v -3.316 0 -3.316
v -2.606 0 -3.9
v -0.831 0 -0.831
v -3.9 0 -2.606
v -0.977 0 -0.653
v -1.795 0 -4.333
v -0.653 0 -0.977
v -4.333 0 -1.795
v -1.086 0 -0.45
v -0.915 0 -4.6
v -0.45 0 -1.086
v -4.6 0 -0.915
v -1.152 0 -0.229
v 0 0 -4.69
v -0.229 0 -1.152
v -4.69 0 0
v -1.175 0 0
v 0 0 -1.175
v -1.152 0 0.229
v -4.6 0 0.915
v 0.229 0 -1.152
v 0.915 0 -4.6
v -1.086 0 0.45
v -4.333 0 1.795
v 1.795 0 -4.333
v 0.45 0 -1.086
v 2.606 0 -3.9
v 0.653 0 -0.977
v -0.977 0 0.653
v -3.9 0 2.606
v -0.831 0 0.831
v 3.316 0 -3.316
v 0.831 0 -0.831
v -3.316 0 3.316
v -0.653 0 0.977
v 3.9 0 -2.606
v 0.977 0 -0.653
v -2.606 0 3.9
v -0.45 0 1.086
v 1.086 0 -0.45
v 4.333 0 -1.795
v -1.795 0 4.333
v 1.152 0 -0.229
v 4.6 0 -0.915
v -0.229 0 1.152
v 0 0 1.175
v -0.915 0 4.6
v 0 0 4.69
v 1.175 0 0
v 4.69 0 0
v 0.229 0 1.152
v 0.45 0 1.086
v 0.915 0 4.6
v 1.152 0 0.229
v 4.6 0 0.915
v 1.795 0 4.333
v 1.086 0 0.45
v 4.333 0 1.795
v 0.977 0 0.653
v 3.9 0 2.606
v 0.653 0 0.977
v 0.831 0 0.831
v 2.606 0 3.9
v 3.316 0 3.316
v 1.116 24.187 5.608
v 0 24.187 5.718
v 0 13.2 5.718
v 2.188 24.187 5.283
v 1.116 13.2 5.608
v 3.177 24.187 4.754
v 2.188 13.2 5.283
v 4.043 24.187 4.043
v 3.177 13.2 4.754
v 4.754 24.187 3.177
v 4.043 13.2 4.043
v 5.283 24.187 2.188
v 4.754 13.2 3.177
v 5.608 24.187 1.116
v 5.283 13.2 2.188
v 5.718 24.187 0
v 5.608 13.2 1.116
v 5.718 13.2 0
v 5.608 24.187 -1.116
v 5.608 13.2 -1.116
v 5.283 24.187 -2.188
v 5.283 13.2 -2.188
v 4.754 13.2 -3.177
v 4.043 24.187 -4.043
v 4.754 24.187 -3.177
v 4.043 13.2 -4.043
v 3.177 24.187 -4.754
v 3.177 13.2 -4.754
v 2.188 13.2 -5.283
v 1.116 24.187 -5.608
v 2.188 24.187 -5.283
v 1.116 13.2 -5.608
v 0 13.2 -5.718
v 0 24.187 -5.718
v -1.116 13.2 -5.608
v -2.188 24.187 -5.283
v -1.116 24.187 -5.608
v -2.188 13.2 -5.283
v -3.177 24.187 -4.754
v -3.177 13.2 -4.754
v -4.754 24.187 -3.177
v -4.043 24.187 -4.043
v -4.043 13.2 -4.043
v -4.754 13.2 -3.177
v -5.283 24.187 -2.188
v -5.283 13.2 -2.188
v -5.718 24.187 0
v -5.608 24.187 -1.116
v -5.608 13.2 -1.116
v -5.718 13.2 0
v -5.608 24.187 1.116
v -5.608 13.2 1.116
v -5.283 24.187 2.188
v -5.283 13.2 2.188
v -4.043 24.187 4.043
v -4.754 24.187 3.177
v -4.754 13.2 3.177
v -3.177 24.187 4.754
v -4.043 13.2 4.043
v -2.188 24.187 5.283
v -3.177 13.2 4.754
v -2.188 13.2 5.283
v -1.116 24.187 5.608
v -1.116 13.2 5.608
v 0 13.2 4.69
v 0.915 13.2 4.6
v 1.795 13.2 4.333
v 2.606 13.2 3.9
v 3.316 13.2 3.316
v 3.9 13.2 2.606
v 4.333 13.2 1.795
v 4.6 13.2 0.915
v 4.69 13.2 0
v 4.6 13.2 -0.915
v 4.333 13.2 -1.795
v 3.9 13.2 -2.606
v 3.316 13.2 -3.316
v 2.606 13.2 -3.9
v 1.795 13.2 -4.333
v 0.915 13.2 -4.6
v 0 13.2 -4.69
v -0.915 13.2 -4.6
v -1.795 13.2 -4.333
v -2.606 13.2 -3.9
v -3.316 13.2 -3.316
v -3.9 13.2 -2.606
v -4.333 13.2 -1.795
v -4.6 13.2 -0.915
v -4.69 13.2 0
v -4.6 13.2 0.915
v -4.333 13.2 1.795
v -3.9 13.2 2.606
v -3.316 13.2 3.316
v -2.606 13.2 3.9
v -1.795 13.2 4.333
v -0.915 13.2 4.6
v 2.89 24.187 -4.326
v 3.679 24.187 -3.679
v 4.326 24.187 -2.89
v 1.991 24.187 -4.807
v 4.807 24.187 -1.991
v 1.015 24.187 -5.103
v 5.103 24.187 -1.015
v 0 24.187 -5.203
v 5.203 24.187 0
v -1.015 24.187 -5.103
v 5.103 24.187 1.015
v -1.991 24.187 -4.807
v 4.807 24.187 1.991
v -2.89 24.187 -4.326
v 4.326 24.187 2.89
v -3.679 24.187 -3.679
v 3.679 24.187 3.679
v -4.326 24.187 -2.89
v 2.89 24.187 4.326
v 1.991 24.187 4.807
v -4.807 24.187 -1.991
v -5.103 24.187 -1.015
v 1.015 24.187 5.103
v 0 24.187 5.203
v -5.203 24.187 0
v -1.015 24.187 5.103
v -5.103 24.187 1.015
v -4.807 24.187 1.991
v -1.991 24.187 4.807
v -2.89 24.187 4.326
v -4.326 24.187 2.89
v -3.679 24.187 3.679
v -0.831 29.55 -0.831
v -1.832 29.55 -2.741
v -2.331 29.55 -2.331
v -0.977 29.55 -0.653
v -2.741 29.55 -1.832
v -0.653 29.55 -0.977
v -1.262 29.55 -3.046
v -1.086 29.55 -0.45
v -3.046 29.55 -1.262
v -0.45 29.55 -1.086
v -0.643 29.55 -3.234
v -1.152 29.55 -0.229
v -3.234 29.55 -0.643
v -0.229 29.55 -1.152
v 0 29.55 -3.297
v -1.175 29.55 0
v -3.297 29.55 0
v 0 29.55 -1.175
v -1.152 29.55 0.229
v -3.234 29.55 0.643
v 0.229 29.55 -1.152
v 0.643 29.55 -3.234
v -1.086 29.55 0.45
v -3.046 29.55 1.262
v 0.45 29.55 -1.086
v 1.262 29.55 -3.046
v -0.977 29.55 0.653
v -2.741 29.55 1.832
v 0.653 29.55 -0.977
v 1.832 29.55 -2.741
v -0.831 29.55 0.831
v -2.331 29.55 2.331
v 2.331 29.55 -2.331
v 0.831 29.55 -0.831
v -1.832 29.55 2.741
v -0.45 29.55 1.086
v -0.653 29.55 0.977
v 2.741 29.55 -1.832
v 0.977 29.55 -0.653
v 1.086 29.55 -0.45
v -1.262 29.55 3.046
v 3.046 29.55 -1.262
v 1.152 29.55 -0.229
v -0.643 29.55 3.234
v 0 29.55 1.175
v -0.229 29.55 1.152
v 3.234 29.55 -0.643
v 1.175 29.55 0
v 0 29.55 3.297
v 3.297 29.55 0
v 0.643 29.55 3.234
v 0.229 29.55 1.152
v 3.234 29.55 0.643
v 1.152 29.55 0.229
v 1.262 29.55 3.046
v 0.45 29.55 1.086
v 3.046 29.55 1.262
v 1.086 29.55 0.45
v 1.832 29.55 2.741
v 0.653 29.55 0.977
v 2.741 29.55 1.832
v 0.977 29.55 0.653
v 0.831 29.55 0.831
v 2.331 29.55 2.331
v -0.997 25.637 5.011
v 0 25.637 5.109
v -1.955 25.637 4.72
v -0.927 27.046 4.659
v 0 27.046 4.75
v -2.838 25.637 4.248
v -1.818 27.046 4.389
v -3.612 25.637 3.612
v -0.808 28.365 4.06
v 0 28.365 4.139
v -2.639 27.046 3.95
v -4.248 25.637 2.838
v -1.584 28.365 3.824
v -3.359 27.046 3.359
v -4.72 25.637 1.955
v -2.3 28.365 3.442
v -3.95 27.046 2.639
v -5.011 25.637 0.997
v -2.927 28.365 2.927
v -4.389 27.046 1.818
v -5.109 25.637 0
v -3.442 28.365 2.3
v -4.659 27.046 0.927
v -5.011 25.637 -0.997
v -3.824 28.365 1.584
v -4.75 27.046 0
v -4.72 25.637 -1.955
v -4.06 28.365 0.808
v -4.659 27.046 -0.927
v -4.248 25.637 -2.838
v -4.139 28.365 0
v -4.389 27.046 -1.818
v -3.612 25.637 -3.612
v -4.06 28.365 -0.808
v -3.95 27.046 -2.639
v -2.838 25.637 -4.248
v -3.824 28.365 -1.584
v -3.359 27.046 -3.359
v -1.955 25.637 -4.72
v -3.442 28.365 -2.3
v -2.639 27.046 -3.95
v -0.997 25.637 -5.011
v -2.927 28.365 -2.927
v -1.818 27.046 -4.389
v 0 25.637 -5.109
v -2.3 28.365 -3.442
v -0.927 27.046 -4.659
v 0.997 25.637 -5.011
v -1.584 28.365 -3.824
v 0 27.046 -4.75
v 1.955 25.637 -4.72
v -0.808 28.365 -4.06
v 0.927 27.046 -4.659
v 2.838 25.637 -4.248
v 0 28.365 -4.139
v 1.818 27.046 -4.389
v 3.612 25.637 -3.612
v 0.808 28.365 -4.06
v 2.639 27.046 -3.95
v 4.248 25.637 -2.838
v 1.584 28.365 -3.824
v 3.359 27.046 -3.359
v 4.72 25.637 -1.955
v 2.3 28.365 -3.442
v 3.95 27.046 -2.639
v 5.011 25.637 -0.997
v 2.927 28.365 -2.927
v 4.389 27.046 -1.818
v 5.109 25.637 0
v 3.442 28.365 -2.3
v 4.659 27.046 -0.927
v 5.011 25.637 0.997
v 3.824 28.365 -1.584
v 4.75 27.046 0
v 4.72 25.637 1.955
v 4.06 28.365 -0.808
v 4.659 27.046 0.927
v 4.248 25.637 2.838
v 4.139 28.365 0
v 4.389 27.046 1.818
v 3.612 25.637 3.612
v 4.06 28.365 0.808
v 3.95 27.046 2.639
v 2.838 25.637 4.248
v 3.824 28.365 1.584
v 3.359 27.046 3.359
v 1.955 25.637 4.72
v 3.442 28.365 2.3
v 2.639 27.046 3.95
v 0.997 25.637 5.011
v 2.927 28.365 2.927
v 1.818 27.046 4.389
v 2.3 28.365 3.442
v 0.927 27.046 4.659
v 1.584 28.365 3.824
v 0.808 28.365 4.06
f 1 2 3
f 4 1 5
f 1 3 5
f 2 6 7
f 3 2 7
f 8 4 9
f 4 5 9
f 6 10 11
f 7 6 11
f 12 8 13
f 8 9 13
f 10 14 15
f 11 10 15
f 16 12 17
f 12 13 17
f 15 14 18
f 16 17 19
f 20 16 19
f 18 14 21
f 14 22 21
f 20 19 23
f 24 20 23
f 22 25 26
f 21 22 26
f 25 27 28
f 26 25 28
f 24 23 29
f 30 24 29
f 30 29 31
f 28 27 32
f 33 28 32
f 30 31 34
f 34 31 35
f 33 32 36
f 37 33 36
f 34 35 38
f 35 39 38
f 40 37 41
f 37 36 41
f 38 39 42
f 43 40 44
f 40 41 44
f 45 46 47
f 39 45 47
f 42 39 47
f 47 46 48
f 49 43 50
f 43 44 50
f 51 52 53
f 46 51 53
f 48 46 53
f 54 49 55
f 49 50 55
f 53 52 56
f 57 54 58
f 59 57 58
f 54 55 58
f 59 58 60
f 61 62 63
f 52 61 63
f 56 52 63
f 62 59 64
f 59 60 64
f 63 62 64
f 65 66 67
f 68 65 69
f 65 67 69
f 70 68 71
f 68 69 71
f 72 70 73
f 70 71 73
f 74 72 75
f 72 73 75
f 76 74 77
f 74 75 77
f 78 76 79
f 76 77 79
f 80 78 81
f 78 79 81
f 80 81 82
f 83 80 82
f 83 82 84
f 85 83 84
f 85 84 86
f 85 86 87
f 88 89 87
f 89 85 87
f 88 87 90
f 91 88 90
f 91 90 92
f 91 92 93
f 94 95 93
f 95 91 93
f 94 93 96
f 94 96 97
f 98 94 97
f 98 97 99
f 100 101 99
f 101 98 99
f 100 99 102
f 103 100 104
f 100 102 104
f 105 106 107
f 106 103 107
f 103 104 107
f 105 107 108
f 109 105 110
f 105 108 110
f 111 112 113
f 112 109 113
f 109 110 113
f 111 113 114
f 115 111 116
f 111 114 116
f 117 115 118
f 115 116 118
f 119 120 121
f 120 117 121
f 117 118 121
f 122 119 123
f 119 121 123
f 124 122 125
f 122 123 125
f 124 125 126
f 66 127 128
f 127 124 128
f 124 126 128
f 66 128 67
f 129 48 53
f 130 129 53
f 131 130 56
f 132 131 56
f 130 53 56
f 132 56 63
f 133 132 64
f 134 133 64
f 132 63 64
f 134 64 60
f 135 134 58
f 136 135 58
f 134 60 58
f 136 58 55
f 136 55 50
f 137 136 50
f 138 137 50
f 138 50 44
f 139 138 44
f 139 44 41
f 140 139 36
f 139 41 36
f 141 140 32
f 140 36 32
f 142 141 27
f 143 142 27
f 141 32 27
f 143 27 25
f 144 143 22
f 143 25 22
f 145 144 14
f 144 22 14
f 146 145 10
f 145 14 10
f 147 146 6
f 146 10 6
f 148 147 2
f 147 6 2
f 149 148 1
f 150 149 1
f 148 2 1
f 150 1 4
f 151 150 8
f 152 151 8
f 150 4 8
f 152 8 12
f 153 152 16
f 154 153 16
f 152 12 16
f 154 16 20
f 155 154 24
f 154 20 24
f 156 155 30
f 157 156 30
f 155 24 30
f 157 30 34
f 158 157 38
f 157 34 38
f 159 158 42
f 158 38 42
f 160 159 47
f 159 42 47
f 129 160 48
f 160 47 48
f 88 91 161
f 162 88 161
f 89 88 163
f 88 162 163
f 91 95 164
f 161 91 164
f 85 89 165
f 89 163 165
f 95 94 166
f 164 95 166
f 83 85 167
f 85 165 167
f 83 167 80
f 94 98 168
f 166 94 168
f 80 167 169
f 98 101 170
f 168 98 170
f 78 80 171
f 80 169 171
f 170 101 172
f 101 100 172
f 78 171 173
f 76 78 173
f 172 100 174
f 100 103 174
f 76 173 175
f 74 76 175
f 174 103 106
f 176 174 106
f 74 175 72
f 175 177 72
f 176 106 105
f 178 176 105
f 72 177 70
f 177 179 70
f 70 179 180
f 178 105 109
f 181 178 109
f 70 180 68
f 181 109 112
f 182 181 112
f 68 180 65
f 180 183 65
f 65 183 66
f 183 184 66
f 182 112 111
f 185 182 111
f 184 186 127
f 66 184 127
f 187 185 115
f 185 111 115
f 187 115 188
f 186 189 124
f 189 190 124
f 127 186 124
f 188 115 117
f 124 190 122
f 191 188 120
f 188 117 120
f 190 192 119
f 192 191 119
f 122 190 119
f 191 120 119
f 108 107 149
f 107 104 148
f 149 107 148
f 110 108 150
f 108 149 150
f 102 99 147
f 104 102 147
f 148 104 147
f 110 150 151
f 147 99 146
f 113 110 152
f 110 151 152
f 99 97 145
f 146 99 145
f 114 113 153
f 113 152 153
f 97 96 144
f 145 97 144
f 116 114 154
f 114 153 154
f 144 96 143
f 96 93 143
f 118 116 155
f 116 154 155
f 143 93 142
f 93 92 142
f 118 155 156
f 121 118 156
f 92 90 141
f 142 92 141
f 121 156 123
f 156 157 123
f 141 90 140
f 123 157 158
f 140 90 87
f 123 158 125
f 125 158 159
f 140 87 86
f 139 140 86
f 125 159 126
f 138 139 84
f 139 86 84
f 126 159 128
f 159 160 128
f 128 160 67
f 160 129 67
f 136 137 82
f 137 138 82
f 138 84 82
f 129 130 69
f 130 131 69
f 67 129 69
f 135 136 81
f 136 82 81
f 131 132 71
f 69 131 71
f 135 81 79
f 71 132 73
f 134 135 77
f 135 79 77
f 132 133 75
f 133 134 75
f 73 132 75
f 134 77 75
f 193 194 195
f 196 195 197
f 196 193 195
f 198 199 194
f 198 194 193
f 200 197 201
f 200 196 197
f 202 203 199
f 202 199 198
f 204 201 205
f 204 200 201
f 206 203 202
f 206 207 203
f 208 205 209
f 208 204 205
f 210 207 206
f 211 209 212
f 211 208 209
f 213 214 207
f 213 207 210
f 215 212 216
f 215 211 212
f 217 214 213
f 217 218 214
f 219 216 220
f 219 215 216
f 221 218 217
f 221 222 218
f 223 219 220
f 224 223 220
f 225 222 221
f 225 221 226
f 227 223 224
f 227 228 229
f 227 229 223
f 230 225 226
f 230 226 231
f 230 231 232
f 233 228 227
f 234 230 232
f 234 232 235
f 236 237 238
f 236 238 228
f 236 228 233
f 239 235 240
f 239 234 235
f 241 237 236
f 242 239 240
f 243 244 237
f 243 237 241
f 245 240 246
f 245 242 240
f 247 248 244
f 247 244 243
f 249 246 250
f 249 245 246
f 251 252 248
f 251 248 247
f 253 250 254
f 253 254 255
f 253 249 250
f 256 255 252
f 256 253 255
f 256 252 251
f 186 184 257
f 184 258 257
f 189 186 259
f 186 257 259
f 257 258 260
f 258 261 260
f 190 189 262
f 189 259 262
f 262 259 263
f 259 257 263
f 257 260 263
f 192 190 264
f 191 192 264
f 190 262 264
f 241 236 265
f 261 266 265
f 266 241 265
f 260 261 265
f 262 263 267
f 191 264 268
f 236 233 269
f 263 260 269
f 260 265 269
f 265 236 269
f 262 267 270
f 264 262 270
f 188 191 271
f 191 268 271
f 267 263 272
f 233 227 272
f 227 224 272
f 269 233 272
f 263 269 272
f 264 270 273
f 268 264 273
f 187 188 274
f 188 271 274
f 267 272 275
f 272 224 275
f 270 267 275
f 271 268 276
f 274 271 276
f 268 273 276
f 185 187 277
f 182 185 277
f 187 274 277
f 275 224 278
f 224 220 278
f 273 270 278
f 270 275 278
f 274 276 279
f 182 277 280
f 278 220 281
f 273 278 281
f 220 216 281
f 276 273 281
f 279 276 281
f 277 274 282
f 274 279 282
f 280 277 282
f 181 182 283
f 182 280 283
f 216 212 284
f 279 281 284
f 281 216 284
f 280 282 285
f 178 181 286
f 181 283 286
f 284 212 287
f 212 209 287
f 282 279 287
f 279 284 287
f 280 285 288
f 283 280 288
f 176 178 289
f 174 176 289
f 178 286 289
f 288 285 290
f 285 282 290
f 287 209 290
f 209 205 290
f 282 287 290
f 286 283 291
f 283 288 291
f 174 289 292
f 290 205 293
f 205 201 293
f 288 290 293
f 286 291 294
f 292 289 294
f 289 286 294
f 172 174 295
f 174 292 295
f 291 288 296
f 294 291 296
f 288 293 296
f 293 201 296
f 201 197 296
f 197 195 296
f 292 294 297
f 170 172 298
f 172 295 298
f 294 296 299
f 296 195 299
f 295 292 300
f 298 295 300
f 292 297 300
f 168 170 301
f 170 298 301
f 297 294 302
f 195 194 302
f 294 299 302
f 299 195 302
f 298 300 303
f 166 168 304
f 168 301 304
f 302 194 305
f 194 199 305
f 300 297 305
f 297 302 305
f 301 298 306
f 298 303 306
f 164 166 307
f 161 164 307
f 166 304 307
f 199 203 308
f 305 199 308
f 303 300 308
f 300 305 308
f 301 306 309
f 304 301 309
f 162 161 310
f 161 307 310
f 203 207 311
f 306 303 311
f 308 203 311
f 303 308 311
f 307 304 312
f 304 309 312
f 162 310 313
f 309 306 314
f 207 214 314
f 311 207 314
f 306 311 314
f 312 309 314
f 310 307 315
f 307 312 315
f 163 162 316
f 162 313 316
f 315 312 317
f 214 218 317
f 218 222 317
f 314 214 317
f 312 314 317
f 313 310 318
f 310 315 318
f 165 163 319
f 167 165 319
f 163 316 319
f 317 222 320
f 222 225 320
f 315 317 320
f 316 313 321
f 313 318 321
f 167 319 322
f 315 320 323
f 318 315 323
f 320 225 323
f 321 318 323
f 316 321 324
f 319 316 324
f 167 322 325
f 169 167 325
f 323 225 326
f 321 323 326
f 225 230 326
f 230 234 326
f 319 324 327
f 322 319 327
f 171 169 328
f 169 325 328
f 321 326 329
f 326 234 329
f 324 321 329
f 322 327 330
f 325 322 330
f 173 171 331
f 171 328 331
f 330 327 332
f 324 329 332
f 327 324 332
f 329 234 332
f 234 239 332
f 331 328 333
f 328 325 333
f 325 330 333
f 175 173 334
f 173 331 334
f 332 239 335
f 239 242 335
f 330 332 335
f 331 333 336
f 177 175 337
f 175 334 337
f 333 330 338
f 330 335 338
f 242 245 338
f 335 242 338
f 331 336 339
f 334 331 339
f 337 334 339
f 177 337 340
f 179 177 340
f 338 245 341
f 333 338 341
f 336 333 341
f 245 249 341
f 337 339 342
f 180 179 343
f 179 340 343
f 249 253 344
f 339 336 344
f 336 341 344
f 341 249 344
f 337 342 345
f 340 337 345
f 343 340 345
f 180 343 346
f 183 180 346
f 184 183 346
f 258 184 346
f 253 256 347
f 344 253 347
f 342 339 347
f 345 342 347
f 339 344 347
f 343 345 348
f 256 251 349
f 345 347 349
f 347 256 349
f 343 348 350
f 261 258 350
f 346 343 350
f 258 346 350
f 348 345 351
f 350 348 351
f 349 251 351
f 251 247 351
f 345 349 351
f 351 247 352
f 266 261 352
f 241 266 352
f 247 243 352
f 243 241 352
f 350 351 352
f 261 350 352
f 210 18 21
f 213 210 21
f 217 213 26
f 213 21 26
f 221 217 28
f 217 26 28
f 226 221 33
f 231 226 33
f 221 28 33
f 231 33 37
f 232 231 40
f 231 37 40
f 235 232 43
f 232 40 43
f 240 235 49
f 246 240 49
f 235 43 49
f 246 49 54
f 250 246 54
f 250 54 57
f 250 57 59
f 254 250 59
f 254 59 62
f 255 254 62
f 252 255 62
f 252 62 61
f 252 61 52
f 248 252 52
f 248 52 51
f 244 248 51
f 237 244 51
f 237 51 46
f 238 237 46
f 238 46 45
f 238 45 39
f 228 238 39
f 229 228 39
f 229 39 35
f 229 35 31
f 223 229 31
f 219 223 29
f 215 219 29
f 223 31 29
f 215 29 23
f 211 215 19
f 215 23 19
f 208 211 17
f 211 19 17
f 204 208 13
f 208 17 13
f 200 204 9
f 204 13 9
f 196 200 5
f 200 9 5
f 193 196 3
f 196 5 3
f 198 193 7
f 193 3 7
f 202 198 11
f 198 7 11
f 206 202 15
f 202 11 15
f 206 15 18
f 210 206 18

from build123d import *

# Parameters (mm, degrees)
SKETCH1_R           = 4.69
BOSS_EXTRUDE1_DEPTH = 13.2
SKETCH2_R           = 5.717952417
BOSS_EXTRUDE2_DEPTH = 16.35
SKETCH4_R           = 1.175
CUT_EXTRUDE1_DEPTH  = 31.636456479


with BuildPart() as part:
    # Sketch1 → Boss-Extrude1 (new body)
    with BuildSketch(Plane(origin=(0, 0, 0), x_dir=(1, 0, 0), z_dir=(0, 1, 0))):
        with Locations(Location((0, 0, 0), (0, 0, 270))):
            Circle(SKETCH1_R)
    extrude(amount=BOSS_EXTRUDE1_DEPTH)

    # Sketch2 → Boss-Extrude2 (add)
    with BuildSketch(Plane(origin=(0, 13.2, 0), x_dir=(1, 0, 0), z_dir=(0, 1, 0))):
        with Locations(Location((0, 0, 0), (0, 0, 270))):
            Circle(SKETCH2_R)
    extrude(amount=BOSS_EXTRUDE2_DEPTH)

    # Sketch3 → Cut-Revolve1 (revolve, cut)
    with BuildSketch(Plane.XY, mode=Mode.PRIVATE) as cut_revolve1_sk:
        with BuildLine():
            Line((3.297149576, 29.55), (5.717952417, 29.55))
            Line((5.717952417, 29.55), (5.717952417, 24.186874615))
            Line((5.717952417, 24.186874615), (5.202740875, 24.186874615))
            ThreePointArc((5.202740875, 24.186874615), (4.750212863, 27.046189194), (3.297149576, 29.55))
        make_face()
    revolve(cut_revolve1_sk.sketch.rotate(Axis((0, 29.55, 0), (0, -1, 0)), 90), axis=Axis((0, 29.55, 0), (0, -1, 0)), mode=Mode.SUBTRACT)

    # Sketch4 → Cut-Extrude1 (cut, through all)
    with BuildSketch(Plane.XZ):
        with Locations(Location((0, 0, 0), (0, 0, 270))):
            Circle(SKETCH4_R)
    extrude(amount=-CUT_EXTRUDE1_DEPTH, mode=Mode.SUBTRACT)


solid = part.part
